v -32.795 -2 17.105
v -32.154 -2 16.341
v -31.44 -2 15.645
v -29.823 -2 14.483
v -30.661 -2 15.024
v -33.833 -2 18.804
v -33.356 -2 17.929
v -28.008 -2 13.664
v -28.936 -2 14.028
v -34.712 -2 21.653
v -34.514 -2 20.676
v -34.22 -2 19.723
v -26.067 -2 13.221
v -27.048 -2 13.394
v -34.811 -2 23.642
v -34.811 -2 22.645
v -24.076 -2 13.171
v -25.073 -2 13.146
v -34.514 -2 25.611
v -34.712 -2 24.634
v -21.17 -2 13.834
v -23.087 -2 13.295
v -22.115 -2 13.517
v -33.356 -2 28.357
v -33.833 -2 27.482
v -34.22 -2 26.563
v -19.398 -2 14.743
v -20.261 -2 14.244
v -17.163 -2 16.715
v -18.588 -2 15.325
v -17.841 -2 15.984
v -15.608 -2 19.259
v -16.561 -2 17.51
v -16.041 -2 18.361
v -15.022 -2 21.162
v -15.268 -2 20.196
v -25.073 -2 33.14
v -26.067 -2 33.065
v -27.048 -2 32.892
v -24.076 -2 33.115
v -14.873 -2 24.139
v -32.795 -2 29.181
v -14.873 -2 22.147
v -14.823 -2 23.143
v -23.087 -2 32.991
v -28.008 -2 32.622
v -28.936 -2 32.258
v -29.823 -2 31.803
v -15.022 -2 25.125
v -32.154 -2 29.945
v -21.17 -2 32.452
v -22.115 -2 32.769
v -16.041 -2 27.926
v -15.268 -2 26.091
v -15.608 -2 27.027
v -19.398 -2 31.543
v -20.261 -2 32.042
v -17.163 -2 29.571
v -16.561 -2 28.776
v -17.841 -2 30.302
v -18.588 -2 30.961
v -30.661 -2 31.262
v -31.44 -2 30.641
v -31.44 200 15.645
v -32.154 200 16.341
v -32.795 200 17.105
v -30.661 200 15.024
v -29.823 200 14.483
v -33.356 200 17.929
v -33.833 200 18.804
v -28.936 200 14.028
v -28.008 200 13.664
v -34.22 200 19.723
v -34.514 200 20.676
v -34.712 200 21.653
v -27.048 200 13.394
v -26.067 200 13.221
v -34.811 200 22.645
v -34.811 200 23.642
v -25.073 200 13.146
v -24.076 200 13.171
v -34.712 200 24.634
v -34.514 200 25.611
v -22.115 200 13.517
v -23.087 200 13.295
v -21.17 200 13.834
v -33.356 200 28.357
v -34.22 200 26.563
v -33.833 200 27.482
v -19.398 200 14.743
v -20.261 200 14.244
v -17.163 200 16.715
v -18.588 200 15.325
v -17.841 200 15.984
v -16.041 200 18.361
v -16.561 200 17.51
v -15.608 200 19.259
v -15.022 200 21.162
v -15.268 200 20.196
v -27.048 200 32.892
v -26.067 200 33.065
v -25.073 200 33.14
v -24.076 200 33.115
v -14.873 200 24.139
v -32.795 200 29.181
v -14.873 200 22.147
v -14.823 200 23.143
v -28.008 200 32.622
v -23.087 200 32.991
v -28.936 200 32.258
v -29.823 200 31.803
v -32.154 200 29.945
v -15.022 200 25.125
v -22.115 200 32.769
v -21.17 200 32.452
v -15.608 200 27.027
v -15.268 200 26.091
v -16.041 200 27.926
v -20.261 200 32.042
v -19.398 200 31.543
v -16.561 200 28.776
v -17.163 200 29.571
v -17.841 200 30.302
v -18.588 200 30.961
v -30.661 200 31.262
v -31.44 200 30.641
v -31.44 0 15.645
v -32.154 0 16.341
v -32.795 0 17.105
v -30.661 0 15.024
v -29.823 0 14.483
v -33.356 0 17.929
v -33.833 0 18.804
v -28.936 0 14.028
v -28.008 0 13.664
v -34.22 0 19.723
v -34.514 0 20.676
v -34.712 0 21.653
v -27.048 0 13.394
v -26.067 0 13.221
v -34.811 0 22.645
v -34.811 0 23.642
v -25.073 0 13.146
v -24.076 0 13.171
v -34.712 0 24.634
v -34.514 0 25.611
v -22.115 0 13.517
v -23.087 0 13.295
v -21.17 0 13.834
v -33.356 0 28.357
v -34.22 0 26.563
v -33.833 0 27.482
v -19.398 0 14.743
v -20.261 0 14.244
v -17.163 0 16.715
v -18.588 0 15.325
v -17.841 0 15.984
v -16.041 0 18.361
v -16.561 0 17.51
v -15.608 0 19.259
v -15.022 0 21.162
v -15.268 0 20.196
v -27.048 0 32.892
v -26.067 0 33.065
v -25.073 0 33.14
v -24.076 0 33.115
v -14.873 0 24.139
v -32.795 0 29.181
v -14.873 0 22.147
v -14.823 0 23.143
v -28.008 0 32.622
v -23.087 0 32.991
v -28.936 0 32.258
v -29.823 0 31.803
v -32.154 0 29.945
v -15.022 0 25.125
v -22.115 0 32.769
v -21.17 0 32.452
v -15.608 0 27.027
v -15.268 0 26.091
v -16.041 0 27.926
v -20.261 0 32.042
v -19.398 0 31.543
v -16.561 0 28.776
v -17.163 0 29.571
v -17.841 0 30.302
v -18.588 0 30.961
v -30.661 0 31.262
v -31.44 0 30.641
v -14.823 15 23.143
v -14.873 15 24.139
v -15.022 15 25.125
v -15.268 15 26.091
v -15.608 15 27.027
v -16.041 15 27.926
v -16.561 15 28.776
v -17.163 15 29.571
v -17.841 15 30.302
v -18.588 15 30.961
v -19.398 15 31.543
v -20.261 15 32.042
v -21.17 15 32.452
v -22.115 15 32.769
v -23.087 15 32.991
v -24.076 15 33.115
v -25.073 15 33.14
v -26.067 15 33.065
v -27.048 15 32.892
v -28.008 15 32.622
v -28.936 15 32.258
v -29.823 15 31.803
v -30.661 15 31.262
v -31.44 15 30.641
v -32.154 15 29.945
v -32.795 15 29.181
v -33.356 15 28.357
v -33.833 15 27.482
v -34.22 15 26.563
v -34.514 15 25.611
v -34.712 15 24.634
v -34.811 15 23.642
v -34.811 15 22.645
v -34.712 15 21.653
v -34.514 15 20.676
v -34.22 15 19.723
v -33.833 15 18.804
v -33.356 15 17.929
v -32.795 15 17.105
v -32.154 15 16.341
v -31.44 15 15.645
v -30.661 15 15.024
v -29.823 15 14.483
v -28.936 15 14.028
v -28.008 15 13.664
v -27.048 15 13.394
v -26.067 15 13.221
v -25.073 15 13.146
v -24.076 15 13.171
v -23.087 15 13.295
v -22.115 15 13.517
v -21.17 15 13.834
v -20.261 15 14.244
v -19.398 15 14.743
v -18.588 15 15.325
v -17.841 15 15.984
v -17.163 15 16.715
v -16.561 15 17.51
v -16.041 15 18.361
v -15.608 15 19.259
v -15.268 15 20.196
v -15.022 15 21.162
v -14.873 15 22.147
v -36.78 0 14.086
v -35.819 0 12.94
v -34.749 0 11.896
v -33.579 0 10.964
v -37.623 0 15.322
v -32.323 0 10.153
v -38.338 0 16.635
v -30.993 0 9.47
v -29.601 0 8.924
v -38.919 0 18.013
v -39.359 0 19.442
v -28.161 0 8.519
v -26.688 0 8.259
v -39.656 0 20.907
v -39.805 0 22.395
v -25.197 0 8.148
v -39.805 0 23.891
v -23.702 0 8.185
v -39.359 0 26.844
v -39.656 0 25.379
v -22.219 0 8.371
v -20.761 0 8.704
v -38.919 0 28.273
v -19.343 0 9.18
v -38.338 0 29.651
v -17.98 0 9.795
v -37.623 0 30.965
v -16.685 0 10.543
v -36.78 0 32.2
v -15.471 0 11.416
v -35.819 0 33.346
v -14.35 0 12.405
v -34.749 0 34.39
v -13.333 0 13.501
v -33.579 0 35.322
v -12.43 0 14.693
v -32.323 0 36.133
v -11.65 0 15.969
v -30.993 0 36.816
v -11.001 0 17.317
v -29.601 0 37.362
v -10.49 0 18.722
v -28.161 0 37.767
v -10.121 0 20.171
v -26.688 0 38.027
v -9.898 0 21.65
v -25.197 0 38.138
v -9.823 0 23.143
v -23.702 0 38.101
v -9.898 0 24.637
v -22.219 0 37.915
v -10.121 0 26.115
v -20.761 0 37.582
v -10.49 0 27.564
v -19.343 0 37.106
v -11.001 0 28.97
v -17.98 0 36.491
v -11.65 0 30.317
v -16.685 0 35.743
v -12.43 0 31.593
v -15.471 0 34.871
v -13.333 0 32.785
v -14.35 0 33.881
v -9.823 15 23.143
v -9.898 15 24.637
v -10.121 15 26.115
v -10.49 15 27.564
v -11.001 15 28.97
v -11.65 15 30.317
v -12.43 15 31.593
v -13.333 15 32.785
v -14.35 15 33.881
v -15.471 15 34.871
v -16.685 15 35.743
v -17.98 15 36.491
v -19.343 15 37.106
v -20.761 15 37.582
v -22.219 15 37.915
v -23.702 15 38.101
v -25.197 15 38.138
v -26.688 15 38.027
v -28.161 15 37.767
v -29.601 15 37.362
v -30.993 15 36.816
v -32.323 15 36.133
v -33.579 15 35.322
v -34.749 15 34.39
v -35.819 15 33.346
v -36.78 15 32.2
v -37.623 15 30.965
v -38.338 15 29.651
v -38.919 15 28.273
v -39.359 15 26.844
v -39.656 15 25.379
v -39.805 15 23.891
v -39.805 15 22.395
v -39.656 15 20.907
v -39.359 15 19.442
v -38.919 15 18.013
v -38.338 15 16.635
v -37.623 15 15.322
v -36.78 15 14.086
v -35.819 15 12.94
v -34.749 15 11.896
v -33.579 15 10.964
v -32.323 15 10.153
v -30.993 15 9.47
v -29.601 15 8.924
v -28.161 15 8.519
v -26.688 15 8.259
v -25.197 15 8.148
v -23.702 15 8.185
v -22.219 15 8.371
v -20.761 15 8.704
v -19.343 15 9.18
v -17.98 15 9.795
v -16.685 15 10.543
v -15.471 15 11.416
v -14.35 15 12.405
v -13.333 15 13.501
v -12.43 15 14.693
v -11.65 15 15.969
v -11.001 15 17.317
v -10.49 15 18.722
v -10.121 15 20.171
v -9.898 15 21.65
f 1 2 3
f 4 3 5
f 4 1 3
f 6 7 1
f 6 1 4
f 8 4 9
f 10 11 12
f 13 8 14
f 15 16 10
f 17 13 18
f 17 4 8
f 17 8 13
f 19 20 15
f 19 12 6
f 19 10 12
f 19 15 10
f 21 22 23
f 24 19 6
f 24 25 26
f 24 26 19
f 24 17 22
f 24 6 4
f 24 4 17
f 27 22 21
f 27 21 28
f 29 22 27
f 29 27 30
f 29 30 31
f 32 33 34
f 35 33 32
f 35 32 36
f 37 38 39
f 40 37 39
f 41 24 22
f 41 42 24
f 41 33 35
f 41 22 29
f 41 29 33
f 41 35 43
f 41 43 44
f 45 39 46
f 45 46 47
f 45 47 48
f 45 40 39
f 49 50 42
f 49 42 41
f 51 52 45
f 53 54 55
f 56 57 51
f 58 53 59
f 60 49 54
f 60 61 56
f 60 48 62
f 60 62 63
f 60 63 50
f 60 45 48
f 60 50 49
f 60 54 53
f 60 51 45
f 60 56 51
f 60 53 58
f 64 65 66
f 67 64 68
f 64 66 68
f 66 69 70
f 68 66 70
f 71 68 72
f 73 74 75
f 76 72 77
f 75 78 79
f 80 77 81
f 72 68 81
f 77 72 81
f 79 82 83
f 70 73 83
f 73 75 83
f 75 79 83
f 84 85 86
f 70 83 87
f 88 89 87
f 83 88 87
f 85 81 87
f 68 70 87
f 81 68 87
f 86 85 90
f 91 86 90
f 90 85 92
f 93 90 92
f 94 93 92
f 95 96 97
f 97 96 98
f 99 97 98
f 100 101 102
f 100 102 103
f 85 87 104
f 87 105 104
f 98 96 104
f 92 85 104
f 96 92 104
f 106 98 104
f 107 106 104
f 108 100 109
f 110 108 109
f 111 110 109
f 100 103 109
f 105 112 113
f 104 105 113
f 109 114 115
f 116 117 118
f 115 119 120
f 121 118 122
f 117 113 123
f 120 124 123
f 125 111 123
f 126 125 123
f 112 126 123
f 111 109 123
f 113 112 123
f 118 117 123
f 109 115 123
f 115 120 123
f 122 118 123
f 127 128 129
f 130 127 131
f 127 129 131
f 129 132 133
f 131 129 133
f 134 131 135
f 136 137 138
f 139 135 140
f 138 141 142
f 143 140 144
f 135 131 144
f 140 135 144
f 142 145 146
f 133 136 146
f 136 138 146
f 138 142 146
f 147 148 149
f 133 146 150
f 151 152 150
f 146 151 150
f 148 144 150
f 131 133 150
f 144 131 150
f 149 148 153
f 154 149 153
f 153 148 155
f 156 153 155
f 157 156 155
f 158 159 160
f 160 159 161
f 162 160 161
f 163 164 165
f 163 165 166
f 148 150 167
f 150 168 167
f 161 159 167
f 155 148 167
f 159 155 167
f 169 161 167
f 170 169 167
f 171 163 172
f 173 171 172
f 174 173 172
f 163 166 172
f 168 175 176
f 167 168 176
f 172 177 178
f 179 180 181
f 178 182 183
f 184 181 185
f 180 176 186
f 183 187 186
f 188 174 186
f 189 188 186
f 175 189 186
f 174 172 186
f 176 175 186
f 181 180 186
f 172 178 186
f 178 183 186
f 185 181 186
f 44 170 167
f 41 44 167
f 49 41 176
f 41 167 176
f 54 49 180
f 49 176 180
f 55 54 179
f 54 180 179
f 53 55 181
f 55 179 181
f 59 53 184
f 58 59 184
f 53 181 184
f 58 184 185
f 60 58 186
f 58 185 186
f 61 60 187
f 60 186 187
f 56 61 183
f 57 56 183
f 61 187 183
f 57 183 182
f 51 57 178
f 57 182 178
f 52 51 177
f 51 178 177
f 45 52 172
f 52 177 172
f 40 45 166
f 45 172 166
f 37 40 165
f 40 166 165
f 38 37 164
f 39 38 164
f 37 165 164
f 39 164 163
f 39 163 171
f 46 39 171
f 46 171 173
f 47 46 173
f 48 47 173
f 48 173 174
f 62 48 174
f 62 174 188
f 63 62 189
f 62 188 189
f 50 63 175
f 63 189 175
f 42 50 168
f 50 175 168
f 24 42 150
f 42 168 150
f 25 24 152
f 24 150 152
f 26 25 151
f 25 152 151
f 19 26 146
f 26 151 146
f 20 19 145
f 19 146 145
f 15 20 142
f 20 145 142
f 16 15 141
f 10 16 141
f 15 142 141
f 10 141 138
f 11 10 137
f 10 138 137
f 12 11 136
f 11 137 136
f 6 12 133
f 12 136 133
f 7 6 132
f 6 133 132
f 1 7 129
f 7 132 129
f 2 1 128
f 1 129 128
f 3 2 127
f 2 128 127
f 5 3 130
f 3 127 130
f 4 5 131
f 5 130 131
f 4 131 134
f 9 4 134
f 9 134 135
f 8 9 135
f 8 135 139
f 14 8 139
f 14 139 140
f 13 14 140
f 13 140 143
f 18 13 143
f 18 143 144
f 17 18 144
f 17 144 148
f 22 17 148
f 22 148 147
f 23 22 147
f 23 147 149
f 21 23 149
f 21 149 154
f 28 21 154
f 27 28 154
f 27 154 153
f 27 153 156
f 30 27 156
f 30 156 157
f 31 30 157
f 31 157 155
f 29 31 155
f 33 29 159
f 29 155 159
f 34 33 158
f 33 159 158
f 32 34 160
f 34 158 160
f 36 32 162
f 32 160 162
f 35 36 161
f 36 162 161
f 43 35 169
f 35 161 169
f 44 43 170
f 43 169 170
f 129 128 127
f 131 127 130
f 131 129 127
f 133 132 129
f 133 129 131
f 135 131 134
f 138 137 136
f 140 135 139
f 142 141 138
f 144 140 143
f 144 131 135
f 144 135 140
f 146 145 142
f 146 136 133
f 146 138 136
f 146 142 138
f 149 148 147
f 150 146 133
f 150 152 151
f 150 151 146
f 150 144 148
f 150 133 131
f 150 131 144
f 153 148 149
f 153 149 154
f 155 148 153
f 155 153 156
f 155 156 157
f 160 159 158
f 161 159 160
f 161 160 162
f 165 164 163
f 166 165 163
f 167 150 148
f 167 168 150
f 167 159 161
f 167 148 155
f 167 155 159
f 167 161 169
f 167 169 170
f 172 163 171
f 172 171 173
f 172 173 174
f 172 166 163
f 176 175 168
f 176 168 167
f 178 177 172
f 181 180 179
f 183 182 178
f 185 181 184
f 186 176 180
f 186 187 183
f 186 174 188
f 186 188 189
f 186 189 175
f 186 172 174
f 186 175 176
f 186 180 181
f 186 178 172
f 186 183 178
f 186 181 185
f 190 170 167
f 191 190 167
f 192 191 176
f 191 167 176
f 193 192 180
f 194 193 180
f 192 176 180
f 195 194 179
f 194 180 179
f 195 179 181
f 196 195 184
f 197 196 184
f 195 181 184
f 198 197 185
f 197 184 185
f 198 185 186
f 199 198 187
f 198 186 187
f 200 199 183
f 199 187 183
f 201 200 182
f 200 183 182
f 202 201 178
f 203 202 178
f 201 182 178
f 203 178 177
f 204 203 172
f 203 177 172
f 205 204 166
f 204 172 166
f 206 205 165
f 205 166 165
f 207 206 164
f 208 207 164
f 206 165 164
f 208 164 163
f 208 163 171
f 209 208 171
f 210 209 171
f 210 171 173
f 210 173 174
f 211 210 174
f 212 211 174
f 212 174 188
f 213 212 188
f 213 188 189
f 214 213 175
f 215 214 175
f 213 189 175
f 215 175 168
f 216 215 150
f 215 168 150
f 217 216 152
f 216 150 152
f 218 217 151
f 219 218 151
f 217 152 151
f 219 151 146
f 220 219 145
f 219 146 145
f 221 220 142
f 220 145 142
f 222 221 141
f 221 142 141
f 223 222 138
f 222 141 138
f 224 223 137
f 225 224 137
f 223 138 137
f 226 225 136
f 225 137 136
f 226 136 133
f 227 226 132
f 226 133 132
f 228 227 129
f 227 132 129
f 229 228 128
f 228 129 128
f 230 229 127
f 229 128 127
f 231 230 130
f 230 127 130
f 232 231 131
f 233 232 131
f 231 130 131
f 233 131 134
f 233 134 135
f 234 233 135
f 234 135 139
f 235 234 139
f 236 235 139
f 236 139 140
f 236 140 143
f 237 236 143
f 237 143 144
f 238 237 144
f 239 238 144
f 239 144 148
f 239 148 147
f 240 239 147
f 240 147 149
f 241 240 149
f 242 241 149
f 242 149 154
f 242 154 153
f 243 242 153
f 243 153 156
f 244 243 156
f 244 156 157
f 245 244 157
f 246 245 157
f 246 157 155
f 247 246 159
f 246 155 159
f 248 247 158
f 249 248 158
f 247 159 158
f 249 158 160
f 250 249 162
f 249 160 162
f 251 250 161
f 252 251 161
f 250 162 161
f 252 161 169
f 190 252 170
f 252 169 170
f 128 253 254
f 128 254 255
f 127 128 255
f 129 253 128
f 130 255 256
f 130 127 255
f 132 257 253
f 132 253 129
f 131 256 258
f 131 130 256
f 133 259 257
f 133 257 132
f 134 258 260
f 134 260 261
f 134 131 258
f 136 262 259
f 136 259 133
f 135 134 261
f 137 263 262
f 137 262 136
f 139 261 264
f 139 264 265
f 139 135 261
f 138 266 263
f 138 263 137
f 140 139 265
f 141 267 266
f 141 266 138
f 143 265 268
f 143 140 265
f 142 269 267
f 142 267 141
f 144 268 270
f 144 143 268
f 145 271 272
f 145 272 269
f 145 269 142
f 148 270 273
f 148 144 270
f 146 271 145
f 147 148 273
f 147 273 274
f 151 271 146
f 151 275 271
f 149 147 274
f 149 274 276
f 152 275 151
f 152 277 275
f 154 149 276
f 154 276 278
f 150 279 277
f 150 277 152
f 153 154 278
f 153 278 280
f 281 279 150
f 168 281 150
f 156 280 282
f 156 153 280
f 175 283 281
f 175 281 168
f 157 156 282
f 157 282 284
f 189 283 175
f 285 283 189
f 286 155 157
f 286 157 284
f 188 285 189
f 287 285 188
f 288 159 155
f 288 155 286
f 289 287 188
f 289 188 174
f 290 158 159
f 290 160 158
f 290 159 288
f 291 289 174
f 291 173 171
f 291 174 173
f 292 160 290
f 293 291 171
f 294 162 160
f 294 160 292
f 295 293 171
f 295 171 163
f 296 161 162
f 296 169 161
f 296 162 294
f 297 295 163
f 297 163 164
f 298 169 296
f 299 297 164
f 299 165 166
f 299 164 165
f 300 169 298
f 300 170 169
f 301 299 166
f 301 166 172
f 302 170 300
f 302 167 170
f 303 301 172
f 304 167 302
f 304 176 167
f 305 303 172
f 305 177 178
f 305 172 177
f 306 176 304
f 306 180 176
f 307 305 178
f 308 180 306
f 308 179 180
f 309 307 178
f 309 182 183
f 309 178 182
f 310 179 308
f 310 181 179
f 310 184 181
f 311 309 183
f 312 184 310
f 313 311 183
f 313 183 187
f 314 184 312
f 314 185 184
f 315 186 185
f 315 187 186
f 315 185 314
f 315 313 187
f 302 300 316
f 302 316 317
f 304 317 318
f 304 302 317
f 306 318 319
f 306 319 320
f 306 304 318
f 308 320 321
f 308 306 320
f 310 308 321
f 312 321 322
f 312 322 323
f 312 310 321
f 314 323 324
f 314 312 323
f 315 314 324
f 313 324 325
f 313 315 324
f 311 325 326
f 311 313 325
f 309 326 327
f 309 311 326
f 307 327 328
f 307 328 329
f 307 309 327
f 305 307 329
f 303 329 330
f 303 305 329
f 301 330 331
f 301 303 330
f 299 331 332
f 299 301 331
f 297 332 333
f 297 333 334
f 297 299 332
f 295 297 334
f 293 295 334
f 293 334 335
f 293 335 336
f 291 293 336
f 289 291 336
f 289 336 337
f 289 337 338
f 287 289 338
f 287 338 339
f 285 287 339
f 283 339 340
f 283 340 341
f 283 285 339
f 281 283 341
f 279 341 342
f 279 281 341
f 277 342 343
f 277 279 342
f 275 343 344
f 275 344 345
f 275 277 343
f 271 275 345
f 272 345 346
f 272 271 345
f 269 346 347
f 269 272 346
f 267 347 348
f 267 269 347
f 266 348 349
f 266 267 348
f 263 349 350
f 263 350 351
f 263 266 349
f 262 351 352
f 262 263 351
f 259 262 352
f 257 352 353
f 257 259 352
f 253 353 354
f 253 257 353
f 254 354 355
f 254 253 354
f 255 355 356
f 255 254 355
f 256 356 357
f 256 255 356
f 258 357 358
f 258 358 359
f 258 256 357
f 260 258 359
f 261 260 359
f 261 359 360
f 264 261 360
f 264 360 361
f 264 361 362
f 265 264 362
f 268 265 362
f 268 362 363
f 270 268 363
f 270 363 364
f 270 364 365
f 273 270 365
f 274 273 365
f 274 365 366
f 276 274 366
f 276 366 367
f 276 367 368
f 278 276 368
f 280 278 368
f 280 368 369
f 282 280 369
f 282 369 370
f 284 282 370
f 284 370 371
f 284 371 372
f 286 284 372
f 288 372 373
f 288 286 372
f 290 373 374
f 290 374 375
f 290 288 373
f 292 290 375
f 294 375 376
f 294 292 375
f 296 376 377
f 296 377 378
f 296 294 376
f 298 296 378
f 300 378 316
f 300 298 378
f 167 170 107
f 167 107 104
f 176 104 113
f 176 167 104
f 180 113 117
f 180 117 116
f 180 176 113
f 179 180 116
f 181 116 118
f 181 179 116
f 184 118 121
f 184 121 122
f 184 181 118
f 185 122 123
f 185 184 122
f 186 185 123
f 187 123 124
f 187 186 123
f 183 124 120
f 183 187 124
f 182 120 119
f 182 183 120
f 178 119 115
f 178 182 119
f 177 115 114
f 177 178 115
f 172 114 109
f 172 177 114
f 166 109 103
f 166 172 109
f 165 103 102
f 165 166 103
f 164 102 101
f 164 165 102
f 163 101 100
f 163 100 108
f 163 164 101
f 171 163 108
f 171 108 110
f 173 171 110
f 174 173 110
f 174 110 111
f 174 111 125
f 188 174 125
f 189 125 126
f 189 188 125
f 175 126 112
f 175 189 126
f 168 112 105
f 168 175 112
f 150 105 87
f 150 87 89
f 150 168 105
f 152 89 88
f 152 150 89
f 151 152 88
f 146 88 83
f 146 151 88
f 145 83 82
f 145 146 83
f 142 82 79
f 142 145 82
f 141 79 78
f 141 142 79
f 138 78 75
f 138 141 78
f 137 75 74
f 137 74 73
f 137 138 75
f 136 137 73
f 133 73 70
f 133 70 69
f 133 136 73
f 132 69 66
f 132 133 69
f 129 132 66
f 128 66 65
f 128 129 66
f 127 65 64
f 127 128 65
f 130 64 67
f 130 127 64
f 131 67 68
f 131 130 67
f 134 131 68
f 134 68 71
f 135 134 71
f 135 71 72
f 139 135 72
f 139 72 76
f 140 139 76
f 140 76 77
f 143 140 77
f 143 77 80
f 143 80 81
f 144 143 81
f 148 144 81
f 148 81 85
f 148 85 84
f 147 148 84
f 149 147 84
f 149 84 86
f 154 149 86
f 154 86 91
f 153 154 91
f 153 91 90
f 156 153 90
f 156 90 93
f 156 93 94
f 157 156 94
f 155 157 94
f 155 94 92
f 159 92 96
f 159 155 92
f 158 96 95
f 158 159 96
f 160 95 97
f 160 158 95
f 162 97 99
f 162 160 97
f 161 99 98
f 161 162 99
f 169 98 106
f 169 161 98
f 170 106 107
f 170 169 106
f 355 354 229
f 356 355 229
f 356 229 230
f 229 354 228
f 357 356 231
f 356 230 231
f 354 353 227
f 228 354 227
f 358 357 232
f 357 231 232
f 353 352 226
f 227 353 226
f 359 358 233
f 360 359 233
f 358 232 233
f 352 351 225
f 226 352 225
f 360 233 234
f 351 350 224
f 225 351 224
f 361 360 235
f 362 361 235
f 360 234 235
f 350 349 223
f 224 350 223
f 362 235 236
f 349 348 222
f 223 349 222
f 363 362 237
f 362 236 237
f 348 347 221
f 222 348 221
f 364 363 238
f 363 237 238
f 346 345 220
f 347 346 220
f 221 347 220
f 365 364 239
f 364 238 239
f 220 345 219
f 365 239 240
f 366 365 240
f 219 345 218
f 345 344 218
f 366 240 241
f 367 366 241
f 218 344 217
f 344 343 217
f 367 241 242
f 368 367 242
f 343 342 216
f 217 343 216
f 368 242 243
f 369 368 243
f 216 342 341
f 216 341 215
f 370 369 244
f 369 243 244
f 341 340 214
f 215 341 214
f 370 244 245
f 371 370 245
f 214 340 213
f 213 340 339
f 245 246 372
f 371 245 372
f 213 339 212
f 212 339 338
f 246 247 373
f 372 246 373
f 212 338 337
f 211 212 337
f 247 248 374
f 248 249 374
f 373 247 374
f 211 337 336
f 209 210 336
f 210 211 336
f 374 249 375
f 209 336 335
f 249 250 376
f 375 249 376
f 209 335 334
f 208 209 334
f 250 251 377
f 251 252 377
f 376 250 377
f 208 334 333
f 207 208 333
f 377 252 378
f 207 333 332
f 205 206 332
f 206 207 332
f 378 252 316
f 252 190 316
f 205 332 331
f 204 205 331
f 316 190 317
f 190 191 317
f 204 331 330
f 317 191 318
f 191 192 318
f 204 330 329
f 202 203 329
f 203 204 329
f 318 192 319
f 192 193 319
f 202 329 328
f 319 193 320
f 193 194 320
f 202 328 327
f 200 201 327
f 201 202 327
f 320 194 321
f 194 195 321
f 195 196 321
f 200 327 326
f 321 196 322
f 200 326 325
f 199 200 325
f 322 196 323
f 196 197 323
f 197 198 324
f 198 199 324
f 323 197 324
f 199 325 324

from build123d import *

# Parameters (mm, degrees)
F0_R     = 10
F1_DEPTH = 2
F0_R_2   = 15
F2_DEPTH = 15
F3_DEPTH = 200


with BuildPart() as f1:
    # F0 (on Front) → F1 (new body)
    with BuildSketch(Plane.XZ):
        with Locations((-24.82326, 23.143079)):
            Circle(F0_R)
    extrude(amount=F1_DEPTH)


with BuildPart() as f2:
    # F0 (on Front) → F2 (new body)
    with BuildSketch(Plane.XZ):
        with Locations((-24.82326, 23.143079)):
            Circle(F0_R_2)
        with Locations((-24.82326, 23.143079)):
            Circle(F0_R, mode=Mode.SUBTRACT)
    extrude(amount=-F2_DEPTH)


with BuildPart() as f3:
    # F0 (on Front) → F3 (new body)
    with BuildSketch(Plane.XZ):
        with Locations((-24.82326, 23.143079)):
            Circle(F0_R)
    extrude(amount=-F3_DEPTH)


solid = Compound([f1.part, f2.part, f3.part])
